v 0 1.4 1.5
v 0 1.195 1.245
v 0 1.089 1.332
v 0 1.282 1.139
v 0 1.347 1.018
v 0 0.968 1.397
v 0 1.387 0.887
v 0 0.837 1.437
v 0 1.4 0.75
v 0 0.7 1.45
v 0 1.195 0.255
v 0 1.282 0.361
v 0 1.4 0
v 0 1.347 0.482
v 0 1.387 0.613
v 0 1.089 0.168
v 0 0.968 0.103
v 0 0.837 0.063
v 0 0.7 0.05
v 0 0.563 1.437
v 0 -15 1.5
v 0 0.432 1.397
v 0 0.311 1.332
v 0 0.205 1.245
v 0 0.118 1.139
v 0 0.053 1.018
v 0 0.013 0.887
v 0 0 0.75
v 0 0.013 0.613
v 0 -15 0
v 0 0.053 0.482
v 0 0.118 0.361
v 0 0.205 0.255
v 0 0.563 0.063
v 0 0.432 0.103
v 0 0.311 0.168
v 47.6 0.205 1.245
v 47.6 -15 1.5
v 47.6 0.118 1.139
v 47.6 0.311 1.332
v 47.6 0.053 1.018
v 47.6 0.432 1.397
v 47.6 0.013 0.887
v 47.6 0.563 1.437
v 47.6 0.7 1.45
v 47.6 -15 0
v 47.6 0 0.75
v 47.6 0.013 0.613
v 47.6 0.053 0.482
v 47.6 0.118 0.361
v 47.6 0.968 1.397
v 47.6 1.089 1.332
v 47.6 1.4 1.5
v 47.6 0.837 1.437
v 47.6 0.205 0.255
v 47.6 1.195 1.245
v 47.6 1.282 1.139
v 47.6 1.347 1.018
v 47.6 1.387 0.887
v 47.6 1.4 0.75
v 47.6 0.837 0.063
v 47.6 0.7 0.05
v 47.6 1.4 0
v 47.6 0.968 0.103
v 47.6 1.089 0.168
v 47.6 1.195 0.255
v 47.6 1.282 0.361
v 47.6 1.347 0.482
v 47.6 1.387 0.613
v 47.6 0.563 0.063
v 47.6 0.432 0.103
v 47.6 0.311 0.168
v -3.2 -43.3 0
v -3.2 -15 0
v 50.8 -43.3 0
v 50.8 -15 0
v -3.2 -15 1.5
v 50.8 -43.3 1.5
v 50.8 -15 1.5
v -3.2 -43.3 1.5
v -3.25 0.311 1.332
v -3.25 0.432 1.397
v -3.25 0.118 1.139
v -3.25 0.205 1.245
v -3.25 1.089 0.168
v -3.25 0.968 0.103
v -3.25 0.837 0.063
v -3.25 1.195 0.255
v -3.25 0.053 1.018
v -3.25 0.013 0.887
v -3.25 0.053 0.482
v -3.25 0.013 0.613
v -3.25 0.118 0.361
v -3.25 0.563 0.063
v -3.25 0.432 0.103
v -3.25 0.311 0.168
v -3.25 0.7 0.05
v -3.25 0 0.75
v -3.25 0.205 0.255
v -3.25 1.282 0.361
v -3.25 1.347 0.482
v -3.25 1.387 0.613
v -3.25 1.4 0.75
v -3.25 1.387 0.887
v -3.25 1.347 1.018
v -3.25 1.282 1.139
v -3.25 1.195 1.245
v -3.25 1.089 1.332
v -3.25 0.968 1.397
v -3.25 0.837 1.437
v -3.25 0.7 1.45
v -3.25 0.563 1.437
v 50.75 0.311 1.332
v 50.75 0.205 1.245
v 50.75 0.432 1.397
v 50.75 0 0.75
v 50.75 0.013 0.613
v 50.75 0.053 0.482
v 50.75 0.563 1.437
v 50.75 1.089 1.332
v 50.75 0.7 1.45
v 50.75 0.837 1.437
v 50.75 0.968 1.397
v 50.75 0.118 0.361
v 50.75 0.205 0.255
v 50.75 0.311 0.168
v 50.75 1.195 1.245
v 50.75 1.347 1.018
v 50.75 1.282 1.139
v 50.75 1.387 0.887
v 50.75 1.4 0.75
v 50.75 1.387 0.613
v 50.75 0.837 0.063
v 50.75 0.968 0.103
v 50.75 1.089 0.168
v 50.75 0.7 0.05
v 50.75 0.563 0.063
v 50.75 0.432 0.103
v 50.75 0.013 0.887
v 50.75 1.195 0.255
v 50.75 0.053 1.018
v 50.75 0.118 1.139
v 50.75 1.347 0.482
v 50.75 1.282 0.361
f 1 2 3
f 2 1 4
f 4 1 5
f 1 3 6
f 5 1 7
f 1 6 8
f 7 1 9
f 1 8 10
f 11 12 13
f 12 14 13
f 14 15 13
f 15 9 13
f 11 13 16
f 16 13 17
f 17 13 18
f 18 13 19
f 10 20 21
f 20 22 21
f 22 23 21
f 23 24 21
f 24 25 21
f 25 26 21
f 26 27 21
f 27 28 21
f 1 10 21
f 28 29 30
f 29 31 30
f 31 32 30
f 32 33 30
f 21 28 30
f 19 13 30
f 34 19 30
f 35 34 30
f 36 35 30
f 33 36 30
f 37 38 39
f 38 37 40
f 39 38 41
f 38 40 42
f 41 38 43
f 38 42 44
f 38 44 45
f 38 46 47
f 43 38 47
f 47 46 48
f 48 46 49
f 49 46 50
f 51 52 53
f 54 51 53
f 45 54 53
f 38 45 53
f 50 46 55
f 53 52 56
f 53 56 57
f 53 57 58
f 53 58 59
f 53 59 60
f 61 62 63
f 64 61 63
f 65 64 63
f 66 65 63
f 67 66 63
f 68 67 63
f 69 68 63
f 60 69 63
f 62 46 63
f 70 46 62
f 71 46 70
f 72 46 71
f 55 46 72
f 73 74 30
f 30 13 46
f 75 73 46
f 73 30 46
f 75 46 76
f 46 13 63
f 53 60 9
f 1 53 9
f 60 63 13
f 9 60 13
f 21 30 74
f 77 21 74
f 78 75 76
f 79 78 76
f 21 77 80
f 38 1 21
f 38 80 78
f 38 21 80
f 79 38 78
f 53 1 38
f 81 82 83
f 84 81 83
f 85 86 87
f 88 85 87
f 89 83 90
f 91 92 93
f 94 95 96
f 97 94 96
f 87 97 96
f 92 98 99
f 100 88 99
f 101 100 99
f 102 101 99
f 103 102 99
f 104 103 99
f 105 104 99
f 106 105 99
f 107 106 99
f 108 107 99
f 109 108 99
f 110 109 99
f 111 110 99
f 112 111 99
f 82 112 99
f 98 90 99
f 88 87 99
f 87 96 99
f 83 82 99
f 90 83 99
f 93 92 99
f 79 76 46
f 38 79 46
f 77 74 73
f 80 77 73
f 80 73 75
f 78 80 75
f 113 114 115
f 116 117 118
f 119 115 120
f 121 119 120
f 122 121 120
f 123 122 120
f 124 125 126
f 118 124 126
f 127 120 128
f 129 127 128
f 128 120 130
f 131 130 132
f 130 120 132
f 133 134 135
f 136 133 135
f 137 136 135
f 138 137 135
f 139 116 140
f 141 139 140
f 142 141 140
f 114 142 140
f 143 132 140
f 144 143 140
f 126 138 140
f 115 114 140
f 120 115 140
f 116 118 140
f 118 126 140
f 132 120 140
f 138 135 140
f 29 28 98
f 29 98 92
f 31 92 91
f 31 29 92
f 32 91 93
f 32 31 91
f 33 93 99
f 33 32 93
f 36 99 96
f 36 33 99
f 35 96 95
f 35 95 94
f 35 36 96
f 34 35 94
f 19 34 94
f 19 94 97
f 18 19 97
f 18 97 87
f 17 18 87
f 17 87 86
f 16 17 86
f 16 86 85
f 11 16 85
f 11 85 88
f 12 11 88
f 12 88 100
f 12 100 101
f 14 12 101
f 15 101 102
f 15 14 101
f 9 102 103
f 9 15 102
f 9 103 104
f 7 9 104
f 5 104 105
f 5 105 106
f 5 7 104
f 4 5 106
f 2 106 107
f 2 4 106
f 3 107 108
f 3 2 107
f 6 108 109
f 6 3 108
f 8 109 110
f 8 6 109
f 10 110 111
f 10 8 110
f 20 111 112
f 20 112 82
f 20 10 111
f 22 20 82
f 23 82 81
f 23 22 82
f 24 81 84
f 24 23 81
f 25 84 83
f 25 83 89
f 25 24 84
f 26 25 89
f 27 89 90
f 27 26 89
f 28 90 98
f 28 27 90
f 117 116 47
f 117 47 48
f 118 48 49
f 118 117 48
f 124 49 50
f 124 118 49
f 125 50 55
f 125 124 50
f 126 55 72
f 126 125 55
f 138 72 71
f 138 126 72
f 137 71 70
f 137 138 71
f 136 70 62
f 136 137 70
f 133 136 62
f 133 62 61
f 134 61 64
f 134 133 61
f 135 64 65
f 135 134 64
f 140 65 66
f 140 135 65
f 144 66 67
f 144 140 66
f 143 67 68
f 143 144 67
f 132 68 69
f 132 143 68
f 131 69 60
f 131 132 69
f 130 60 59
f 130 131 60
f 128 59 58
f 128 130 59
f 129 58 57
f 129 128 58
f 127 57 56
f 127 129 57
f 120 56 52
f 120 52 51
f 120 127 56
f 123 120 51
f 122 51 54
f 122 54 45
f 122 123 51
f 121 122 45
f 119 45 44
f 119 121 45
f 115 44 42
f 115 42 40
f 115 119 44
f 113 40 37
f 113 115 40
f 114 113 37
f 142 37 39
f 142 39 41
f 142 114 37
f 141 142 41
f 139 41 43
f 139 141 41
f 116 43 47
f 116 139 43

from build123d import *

# Parameters (mm, degrees)
BOSS_EXTRUDE1_DEPTH = 1.5
CUT_EXTRUDE5_START  = -3.25
CUT_EXTRUDE5_DEPTH  = 3.25
CUT_EXTRUDE6_START  = -54
CUT_EXTRUDE6_DEPTH  = 3.15


# Read off the part's stored shape, not the designer's step: Cut-Extrude6
with BuildPart() as part:
    # Sketch1 → Boss-Extrude1 (new body)
    with BuildSketch(Plane.XY):
        Polygon((47.6, -15), (47.6, 0), (50.75, 0), (50.75, 1.4), (42.5, 1.4), (5.1, 1.4), (-3.25, 1.4), (-3.25, 0), (0, 0), (0, -15), (-3.2, -15), (-3.2, -43.3), (50.8, -43.3), (50.8, -15), align=None)
    extrude(amount=BOSS_EXTRUDE1_DEPTH)

    # Sketch3 → Cut-Extrude5 (cut)
    with BuildSketch(Plane.ZY.offset(3.25).offset(CUT_EXTRUDE5_START)):
        with BuildLine():
            Line((0.75, 1.4), (0, 1.4))
            Line((0, 1.4), (0, 0))
            Line((0, 0), (0.75, 0))
            ThreePointArc((0.75, 0), (0.05, 0.7), (0.75, 1.4))
        make_face()
        with BuildLine():
            Line((1.5, 1.4), (0.75, 1.4))
            ThreePointArc((0.75, 1.4), (1.45, 0.7), (0.75, 0))
            Line((0.75, 0), (1.5, 0))
            Line((1.5, 0), (1.5, 1.4))
        make_face()
    extrude(amount=CUT_EXTRUDE5_DEPTH, mode=Mode.SUBTRACT)

    # Cut-Extrude6 outline → Cut-Extrude6 (cut)
    with BuildSketch(Plane.ZY.offset(3.25).offset(CUT_EXTRUDE6_START)):
        with BuildLine():
            ThreePointArc((0.75, 1.4), (1.45, 0.7), (0.75, 0))
            Line((0.75, 0), (1.5, 0))
            Line((1.5, 0), (1.5, 1.4))
            Line((1.5, 1.4), (0.75, 1.4))
        make_face()
        with BuildLine():
            ThreePointArc((0.75, 0), (0.05, 0.7), (0.75, 1.4))
            Line((0.75, 1.4), (0, 1.4))
            Line((0, 1.4), (0, 0))
            Line((0, 0), (0.75, 0))
        make_face()
    extrude(amount=CUT_EXTRUDE6_DEPTH, mode=Mode.SUBTRACT)


solid = part.part
